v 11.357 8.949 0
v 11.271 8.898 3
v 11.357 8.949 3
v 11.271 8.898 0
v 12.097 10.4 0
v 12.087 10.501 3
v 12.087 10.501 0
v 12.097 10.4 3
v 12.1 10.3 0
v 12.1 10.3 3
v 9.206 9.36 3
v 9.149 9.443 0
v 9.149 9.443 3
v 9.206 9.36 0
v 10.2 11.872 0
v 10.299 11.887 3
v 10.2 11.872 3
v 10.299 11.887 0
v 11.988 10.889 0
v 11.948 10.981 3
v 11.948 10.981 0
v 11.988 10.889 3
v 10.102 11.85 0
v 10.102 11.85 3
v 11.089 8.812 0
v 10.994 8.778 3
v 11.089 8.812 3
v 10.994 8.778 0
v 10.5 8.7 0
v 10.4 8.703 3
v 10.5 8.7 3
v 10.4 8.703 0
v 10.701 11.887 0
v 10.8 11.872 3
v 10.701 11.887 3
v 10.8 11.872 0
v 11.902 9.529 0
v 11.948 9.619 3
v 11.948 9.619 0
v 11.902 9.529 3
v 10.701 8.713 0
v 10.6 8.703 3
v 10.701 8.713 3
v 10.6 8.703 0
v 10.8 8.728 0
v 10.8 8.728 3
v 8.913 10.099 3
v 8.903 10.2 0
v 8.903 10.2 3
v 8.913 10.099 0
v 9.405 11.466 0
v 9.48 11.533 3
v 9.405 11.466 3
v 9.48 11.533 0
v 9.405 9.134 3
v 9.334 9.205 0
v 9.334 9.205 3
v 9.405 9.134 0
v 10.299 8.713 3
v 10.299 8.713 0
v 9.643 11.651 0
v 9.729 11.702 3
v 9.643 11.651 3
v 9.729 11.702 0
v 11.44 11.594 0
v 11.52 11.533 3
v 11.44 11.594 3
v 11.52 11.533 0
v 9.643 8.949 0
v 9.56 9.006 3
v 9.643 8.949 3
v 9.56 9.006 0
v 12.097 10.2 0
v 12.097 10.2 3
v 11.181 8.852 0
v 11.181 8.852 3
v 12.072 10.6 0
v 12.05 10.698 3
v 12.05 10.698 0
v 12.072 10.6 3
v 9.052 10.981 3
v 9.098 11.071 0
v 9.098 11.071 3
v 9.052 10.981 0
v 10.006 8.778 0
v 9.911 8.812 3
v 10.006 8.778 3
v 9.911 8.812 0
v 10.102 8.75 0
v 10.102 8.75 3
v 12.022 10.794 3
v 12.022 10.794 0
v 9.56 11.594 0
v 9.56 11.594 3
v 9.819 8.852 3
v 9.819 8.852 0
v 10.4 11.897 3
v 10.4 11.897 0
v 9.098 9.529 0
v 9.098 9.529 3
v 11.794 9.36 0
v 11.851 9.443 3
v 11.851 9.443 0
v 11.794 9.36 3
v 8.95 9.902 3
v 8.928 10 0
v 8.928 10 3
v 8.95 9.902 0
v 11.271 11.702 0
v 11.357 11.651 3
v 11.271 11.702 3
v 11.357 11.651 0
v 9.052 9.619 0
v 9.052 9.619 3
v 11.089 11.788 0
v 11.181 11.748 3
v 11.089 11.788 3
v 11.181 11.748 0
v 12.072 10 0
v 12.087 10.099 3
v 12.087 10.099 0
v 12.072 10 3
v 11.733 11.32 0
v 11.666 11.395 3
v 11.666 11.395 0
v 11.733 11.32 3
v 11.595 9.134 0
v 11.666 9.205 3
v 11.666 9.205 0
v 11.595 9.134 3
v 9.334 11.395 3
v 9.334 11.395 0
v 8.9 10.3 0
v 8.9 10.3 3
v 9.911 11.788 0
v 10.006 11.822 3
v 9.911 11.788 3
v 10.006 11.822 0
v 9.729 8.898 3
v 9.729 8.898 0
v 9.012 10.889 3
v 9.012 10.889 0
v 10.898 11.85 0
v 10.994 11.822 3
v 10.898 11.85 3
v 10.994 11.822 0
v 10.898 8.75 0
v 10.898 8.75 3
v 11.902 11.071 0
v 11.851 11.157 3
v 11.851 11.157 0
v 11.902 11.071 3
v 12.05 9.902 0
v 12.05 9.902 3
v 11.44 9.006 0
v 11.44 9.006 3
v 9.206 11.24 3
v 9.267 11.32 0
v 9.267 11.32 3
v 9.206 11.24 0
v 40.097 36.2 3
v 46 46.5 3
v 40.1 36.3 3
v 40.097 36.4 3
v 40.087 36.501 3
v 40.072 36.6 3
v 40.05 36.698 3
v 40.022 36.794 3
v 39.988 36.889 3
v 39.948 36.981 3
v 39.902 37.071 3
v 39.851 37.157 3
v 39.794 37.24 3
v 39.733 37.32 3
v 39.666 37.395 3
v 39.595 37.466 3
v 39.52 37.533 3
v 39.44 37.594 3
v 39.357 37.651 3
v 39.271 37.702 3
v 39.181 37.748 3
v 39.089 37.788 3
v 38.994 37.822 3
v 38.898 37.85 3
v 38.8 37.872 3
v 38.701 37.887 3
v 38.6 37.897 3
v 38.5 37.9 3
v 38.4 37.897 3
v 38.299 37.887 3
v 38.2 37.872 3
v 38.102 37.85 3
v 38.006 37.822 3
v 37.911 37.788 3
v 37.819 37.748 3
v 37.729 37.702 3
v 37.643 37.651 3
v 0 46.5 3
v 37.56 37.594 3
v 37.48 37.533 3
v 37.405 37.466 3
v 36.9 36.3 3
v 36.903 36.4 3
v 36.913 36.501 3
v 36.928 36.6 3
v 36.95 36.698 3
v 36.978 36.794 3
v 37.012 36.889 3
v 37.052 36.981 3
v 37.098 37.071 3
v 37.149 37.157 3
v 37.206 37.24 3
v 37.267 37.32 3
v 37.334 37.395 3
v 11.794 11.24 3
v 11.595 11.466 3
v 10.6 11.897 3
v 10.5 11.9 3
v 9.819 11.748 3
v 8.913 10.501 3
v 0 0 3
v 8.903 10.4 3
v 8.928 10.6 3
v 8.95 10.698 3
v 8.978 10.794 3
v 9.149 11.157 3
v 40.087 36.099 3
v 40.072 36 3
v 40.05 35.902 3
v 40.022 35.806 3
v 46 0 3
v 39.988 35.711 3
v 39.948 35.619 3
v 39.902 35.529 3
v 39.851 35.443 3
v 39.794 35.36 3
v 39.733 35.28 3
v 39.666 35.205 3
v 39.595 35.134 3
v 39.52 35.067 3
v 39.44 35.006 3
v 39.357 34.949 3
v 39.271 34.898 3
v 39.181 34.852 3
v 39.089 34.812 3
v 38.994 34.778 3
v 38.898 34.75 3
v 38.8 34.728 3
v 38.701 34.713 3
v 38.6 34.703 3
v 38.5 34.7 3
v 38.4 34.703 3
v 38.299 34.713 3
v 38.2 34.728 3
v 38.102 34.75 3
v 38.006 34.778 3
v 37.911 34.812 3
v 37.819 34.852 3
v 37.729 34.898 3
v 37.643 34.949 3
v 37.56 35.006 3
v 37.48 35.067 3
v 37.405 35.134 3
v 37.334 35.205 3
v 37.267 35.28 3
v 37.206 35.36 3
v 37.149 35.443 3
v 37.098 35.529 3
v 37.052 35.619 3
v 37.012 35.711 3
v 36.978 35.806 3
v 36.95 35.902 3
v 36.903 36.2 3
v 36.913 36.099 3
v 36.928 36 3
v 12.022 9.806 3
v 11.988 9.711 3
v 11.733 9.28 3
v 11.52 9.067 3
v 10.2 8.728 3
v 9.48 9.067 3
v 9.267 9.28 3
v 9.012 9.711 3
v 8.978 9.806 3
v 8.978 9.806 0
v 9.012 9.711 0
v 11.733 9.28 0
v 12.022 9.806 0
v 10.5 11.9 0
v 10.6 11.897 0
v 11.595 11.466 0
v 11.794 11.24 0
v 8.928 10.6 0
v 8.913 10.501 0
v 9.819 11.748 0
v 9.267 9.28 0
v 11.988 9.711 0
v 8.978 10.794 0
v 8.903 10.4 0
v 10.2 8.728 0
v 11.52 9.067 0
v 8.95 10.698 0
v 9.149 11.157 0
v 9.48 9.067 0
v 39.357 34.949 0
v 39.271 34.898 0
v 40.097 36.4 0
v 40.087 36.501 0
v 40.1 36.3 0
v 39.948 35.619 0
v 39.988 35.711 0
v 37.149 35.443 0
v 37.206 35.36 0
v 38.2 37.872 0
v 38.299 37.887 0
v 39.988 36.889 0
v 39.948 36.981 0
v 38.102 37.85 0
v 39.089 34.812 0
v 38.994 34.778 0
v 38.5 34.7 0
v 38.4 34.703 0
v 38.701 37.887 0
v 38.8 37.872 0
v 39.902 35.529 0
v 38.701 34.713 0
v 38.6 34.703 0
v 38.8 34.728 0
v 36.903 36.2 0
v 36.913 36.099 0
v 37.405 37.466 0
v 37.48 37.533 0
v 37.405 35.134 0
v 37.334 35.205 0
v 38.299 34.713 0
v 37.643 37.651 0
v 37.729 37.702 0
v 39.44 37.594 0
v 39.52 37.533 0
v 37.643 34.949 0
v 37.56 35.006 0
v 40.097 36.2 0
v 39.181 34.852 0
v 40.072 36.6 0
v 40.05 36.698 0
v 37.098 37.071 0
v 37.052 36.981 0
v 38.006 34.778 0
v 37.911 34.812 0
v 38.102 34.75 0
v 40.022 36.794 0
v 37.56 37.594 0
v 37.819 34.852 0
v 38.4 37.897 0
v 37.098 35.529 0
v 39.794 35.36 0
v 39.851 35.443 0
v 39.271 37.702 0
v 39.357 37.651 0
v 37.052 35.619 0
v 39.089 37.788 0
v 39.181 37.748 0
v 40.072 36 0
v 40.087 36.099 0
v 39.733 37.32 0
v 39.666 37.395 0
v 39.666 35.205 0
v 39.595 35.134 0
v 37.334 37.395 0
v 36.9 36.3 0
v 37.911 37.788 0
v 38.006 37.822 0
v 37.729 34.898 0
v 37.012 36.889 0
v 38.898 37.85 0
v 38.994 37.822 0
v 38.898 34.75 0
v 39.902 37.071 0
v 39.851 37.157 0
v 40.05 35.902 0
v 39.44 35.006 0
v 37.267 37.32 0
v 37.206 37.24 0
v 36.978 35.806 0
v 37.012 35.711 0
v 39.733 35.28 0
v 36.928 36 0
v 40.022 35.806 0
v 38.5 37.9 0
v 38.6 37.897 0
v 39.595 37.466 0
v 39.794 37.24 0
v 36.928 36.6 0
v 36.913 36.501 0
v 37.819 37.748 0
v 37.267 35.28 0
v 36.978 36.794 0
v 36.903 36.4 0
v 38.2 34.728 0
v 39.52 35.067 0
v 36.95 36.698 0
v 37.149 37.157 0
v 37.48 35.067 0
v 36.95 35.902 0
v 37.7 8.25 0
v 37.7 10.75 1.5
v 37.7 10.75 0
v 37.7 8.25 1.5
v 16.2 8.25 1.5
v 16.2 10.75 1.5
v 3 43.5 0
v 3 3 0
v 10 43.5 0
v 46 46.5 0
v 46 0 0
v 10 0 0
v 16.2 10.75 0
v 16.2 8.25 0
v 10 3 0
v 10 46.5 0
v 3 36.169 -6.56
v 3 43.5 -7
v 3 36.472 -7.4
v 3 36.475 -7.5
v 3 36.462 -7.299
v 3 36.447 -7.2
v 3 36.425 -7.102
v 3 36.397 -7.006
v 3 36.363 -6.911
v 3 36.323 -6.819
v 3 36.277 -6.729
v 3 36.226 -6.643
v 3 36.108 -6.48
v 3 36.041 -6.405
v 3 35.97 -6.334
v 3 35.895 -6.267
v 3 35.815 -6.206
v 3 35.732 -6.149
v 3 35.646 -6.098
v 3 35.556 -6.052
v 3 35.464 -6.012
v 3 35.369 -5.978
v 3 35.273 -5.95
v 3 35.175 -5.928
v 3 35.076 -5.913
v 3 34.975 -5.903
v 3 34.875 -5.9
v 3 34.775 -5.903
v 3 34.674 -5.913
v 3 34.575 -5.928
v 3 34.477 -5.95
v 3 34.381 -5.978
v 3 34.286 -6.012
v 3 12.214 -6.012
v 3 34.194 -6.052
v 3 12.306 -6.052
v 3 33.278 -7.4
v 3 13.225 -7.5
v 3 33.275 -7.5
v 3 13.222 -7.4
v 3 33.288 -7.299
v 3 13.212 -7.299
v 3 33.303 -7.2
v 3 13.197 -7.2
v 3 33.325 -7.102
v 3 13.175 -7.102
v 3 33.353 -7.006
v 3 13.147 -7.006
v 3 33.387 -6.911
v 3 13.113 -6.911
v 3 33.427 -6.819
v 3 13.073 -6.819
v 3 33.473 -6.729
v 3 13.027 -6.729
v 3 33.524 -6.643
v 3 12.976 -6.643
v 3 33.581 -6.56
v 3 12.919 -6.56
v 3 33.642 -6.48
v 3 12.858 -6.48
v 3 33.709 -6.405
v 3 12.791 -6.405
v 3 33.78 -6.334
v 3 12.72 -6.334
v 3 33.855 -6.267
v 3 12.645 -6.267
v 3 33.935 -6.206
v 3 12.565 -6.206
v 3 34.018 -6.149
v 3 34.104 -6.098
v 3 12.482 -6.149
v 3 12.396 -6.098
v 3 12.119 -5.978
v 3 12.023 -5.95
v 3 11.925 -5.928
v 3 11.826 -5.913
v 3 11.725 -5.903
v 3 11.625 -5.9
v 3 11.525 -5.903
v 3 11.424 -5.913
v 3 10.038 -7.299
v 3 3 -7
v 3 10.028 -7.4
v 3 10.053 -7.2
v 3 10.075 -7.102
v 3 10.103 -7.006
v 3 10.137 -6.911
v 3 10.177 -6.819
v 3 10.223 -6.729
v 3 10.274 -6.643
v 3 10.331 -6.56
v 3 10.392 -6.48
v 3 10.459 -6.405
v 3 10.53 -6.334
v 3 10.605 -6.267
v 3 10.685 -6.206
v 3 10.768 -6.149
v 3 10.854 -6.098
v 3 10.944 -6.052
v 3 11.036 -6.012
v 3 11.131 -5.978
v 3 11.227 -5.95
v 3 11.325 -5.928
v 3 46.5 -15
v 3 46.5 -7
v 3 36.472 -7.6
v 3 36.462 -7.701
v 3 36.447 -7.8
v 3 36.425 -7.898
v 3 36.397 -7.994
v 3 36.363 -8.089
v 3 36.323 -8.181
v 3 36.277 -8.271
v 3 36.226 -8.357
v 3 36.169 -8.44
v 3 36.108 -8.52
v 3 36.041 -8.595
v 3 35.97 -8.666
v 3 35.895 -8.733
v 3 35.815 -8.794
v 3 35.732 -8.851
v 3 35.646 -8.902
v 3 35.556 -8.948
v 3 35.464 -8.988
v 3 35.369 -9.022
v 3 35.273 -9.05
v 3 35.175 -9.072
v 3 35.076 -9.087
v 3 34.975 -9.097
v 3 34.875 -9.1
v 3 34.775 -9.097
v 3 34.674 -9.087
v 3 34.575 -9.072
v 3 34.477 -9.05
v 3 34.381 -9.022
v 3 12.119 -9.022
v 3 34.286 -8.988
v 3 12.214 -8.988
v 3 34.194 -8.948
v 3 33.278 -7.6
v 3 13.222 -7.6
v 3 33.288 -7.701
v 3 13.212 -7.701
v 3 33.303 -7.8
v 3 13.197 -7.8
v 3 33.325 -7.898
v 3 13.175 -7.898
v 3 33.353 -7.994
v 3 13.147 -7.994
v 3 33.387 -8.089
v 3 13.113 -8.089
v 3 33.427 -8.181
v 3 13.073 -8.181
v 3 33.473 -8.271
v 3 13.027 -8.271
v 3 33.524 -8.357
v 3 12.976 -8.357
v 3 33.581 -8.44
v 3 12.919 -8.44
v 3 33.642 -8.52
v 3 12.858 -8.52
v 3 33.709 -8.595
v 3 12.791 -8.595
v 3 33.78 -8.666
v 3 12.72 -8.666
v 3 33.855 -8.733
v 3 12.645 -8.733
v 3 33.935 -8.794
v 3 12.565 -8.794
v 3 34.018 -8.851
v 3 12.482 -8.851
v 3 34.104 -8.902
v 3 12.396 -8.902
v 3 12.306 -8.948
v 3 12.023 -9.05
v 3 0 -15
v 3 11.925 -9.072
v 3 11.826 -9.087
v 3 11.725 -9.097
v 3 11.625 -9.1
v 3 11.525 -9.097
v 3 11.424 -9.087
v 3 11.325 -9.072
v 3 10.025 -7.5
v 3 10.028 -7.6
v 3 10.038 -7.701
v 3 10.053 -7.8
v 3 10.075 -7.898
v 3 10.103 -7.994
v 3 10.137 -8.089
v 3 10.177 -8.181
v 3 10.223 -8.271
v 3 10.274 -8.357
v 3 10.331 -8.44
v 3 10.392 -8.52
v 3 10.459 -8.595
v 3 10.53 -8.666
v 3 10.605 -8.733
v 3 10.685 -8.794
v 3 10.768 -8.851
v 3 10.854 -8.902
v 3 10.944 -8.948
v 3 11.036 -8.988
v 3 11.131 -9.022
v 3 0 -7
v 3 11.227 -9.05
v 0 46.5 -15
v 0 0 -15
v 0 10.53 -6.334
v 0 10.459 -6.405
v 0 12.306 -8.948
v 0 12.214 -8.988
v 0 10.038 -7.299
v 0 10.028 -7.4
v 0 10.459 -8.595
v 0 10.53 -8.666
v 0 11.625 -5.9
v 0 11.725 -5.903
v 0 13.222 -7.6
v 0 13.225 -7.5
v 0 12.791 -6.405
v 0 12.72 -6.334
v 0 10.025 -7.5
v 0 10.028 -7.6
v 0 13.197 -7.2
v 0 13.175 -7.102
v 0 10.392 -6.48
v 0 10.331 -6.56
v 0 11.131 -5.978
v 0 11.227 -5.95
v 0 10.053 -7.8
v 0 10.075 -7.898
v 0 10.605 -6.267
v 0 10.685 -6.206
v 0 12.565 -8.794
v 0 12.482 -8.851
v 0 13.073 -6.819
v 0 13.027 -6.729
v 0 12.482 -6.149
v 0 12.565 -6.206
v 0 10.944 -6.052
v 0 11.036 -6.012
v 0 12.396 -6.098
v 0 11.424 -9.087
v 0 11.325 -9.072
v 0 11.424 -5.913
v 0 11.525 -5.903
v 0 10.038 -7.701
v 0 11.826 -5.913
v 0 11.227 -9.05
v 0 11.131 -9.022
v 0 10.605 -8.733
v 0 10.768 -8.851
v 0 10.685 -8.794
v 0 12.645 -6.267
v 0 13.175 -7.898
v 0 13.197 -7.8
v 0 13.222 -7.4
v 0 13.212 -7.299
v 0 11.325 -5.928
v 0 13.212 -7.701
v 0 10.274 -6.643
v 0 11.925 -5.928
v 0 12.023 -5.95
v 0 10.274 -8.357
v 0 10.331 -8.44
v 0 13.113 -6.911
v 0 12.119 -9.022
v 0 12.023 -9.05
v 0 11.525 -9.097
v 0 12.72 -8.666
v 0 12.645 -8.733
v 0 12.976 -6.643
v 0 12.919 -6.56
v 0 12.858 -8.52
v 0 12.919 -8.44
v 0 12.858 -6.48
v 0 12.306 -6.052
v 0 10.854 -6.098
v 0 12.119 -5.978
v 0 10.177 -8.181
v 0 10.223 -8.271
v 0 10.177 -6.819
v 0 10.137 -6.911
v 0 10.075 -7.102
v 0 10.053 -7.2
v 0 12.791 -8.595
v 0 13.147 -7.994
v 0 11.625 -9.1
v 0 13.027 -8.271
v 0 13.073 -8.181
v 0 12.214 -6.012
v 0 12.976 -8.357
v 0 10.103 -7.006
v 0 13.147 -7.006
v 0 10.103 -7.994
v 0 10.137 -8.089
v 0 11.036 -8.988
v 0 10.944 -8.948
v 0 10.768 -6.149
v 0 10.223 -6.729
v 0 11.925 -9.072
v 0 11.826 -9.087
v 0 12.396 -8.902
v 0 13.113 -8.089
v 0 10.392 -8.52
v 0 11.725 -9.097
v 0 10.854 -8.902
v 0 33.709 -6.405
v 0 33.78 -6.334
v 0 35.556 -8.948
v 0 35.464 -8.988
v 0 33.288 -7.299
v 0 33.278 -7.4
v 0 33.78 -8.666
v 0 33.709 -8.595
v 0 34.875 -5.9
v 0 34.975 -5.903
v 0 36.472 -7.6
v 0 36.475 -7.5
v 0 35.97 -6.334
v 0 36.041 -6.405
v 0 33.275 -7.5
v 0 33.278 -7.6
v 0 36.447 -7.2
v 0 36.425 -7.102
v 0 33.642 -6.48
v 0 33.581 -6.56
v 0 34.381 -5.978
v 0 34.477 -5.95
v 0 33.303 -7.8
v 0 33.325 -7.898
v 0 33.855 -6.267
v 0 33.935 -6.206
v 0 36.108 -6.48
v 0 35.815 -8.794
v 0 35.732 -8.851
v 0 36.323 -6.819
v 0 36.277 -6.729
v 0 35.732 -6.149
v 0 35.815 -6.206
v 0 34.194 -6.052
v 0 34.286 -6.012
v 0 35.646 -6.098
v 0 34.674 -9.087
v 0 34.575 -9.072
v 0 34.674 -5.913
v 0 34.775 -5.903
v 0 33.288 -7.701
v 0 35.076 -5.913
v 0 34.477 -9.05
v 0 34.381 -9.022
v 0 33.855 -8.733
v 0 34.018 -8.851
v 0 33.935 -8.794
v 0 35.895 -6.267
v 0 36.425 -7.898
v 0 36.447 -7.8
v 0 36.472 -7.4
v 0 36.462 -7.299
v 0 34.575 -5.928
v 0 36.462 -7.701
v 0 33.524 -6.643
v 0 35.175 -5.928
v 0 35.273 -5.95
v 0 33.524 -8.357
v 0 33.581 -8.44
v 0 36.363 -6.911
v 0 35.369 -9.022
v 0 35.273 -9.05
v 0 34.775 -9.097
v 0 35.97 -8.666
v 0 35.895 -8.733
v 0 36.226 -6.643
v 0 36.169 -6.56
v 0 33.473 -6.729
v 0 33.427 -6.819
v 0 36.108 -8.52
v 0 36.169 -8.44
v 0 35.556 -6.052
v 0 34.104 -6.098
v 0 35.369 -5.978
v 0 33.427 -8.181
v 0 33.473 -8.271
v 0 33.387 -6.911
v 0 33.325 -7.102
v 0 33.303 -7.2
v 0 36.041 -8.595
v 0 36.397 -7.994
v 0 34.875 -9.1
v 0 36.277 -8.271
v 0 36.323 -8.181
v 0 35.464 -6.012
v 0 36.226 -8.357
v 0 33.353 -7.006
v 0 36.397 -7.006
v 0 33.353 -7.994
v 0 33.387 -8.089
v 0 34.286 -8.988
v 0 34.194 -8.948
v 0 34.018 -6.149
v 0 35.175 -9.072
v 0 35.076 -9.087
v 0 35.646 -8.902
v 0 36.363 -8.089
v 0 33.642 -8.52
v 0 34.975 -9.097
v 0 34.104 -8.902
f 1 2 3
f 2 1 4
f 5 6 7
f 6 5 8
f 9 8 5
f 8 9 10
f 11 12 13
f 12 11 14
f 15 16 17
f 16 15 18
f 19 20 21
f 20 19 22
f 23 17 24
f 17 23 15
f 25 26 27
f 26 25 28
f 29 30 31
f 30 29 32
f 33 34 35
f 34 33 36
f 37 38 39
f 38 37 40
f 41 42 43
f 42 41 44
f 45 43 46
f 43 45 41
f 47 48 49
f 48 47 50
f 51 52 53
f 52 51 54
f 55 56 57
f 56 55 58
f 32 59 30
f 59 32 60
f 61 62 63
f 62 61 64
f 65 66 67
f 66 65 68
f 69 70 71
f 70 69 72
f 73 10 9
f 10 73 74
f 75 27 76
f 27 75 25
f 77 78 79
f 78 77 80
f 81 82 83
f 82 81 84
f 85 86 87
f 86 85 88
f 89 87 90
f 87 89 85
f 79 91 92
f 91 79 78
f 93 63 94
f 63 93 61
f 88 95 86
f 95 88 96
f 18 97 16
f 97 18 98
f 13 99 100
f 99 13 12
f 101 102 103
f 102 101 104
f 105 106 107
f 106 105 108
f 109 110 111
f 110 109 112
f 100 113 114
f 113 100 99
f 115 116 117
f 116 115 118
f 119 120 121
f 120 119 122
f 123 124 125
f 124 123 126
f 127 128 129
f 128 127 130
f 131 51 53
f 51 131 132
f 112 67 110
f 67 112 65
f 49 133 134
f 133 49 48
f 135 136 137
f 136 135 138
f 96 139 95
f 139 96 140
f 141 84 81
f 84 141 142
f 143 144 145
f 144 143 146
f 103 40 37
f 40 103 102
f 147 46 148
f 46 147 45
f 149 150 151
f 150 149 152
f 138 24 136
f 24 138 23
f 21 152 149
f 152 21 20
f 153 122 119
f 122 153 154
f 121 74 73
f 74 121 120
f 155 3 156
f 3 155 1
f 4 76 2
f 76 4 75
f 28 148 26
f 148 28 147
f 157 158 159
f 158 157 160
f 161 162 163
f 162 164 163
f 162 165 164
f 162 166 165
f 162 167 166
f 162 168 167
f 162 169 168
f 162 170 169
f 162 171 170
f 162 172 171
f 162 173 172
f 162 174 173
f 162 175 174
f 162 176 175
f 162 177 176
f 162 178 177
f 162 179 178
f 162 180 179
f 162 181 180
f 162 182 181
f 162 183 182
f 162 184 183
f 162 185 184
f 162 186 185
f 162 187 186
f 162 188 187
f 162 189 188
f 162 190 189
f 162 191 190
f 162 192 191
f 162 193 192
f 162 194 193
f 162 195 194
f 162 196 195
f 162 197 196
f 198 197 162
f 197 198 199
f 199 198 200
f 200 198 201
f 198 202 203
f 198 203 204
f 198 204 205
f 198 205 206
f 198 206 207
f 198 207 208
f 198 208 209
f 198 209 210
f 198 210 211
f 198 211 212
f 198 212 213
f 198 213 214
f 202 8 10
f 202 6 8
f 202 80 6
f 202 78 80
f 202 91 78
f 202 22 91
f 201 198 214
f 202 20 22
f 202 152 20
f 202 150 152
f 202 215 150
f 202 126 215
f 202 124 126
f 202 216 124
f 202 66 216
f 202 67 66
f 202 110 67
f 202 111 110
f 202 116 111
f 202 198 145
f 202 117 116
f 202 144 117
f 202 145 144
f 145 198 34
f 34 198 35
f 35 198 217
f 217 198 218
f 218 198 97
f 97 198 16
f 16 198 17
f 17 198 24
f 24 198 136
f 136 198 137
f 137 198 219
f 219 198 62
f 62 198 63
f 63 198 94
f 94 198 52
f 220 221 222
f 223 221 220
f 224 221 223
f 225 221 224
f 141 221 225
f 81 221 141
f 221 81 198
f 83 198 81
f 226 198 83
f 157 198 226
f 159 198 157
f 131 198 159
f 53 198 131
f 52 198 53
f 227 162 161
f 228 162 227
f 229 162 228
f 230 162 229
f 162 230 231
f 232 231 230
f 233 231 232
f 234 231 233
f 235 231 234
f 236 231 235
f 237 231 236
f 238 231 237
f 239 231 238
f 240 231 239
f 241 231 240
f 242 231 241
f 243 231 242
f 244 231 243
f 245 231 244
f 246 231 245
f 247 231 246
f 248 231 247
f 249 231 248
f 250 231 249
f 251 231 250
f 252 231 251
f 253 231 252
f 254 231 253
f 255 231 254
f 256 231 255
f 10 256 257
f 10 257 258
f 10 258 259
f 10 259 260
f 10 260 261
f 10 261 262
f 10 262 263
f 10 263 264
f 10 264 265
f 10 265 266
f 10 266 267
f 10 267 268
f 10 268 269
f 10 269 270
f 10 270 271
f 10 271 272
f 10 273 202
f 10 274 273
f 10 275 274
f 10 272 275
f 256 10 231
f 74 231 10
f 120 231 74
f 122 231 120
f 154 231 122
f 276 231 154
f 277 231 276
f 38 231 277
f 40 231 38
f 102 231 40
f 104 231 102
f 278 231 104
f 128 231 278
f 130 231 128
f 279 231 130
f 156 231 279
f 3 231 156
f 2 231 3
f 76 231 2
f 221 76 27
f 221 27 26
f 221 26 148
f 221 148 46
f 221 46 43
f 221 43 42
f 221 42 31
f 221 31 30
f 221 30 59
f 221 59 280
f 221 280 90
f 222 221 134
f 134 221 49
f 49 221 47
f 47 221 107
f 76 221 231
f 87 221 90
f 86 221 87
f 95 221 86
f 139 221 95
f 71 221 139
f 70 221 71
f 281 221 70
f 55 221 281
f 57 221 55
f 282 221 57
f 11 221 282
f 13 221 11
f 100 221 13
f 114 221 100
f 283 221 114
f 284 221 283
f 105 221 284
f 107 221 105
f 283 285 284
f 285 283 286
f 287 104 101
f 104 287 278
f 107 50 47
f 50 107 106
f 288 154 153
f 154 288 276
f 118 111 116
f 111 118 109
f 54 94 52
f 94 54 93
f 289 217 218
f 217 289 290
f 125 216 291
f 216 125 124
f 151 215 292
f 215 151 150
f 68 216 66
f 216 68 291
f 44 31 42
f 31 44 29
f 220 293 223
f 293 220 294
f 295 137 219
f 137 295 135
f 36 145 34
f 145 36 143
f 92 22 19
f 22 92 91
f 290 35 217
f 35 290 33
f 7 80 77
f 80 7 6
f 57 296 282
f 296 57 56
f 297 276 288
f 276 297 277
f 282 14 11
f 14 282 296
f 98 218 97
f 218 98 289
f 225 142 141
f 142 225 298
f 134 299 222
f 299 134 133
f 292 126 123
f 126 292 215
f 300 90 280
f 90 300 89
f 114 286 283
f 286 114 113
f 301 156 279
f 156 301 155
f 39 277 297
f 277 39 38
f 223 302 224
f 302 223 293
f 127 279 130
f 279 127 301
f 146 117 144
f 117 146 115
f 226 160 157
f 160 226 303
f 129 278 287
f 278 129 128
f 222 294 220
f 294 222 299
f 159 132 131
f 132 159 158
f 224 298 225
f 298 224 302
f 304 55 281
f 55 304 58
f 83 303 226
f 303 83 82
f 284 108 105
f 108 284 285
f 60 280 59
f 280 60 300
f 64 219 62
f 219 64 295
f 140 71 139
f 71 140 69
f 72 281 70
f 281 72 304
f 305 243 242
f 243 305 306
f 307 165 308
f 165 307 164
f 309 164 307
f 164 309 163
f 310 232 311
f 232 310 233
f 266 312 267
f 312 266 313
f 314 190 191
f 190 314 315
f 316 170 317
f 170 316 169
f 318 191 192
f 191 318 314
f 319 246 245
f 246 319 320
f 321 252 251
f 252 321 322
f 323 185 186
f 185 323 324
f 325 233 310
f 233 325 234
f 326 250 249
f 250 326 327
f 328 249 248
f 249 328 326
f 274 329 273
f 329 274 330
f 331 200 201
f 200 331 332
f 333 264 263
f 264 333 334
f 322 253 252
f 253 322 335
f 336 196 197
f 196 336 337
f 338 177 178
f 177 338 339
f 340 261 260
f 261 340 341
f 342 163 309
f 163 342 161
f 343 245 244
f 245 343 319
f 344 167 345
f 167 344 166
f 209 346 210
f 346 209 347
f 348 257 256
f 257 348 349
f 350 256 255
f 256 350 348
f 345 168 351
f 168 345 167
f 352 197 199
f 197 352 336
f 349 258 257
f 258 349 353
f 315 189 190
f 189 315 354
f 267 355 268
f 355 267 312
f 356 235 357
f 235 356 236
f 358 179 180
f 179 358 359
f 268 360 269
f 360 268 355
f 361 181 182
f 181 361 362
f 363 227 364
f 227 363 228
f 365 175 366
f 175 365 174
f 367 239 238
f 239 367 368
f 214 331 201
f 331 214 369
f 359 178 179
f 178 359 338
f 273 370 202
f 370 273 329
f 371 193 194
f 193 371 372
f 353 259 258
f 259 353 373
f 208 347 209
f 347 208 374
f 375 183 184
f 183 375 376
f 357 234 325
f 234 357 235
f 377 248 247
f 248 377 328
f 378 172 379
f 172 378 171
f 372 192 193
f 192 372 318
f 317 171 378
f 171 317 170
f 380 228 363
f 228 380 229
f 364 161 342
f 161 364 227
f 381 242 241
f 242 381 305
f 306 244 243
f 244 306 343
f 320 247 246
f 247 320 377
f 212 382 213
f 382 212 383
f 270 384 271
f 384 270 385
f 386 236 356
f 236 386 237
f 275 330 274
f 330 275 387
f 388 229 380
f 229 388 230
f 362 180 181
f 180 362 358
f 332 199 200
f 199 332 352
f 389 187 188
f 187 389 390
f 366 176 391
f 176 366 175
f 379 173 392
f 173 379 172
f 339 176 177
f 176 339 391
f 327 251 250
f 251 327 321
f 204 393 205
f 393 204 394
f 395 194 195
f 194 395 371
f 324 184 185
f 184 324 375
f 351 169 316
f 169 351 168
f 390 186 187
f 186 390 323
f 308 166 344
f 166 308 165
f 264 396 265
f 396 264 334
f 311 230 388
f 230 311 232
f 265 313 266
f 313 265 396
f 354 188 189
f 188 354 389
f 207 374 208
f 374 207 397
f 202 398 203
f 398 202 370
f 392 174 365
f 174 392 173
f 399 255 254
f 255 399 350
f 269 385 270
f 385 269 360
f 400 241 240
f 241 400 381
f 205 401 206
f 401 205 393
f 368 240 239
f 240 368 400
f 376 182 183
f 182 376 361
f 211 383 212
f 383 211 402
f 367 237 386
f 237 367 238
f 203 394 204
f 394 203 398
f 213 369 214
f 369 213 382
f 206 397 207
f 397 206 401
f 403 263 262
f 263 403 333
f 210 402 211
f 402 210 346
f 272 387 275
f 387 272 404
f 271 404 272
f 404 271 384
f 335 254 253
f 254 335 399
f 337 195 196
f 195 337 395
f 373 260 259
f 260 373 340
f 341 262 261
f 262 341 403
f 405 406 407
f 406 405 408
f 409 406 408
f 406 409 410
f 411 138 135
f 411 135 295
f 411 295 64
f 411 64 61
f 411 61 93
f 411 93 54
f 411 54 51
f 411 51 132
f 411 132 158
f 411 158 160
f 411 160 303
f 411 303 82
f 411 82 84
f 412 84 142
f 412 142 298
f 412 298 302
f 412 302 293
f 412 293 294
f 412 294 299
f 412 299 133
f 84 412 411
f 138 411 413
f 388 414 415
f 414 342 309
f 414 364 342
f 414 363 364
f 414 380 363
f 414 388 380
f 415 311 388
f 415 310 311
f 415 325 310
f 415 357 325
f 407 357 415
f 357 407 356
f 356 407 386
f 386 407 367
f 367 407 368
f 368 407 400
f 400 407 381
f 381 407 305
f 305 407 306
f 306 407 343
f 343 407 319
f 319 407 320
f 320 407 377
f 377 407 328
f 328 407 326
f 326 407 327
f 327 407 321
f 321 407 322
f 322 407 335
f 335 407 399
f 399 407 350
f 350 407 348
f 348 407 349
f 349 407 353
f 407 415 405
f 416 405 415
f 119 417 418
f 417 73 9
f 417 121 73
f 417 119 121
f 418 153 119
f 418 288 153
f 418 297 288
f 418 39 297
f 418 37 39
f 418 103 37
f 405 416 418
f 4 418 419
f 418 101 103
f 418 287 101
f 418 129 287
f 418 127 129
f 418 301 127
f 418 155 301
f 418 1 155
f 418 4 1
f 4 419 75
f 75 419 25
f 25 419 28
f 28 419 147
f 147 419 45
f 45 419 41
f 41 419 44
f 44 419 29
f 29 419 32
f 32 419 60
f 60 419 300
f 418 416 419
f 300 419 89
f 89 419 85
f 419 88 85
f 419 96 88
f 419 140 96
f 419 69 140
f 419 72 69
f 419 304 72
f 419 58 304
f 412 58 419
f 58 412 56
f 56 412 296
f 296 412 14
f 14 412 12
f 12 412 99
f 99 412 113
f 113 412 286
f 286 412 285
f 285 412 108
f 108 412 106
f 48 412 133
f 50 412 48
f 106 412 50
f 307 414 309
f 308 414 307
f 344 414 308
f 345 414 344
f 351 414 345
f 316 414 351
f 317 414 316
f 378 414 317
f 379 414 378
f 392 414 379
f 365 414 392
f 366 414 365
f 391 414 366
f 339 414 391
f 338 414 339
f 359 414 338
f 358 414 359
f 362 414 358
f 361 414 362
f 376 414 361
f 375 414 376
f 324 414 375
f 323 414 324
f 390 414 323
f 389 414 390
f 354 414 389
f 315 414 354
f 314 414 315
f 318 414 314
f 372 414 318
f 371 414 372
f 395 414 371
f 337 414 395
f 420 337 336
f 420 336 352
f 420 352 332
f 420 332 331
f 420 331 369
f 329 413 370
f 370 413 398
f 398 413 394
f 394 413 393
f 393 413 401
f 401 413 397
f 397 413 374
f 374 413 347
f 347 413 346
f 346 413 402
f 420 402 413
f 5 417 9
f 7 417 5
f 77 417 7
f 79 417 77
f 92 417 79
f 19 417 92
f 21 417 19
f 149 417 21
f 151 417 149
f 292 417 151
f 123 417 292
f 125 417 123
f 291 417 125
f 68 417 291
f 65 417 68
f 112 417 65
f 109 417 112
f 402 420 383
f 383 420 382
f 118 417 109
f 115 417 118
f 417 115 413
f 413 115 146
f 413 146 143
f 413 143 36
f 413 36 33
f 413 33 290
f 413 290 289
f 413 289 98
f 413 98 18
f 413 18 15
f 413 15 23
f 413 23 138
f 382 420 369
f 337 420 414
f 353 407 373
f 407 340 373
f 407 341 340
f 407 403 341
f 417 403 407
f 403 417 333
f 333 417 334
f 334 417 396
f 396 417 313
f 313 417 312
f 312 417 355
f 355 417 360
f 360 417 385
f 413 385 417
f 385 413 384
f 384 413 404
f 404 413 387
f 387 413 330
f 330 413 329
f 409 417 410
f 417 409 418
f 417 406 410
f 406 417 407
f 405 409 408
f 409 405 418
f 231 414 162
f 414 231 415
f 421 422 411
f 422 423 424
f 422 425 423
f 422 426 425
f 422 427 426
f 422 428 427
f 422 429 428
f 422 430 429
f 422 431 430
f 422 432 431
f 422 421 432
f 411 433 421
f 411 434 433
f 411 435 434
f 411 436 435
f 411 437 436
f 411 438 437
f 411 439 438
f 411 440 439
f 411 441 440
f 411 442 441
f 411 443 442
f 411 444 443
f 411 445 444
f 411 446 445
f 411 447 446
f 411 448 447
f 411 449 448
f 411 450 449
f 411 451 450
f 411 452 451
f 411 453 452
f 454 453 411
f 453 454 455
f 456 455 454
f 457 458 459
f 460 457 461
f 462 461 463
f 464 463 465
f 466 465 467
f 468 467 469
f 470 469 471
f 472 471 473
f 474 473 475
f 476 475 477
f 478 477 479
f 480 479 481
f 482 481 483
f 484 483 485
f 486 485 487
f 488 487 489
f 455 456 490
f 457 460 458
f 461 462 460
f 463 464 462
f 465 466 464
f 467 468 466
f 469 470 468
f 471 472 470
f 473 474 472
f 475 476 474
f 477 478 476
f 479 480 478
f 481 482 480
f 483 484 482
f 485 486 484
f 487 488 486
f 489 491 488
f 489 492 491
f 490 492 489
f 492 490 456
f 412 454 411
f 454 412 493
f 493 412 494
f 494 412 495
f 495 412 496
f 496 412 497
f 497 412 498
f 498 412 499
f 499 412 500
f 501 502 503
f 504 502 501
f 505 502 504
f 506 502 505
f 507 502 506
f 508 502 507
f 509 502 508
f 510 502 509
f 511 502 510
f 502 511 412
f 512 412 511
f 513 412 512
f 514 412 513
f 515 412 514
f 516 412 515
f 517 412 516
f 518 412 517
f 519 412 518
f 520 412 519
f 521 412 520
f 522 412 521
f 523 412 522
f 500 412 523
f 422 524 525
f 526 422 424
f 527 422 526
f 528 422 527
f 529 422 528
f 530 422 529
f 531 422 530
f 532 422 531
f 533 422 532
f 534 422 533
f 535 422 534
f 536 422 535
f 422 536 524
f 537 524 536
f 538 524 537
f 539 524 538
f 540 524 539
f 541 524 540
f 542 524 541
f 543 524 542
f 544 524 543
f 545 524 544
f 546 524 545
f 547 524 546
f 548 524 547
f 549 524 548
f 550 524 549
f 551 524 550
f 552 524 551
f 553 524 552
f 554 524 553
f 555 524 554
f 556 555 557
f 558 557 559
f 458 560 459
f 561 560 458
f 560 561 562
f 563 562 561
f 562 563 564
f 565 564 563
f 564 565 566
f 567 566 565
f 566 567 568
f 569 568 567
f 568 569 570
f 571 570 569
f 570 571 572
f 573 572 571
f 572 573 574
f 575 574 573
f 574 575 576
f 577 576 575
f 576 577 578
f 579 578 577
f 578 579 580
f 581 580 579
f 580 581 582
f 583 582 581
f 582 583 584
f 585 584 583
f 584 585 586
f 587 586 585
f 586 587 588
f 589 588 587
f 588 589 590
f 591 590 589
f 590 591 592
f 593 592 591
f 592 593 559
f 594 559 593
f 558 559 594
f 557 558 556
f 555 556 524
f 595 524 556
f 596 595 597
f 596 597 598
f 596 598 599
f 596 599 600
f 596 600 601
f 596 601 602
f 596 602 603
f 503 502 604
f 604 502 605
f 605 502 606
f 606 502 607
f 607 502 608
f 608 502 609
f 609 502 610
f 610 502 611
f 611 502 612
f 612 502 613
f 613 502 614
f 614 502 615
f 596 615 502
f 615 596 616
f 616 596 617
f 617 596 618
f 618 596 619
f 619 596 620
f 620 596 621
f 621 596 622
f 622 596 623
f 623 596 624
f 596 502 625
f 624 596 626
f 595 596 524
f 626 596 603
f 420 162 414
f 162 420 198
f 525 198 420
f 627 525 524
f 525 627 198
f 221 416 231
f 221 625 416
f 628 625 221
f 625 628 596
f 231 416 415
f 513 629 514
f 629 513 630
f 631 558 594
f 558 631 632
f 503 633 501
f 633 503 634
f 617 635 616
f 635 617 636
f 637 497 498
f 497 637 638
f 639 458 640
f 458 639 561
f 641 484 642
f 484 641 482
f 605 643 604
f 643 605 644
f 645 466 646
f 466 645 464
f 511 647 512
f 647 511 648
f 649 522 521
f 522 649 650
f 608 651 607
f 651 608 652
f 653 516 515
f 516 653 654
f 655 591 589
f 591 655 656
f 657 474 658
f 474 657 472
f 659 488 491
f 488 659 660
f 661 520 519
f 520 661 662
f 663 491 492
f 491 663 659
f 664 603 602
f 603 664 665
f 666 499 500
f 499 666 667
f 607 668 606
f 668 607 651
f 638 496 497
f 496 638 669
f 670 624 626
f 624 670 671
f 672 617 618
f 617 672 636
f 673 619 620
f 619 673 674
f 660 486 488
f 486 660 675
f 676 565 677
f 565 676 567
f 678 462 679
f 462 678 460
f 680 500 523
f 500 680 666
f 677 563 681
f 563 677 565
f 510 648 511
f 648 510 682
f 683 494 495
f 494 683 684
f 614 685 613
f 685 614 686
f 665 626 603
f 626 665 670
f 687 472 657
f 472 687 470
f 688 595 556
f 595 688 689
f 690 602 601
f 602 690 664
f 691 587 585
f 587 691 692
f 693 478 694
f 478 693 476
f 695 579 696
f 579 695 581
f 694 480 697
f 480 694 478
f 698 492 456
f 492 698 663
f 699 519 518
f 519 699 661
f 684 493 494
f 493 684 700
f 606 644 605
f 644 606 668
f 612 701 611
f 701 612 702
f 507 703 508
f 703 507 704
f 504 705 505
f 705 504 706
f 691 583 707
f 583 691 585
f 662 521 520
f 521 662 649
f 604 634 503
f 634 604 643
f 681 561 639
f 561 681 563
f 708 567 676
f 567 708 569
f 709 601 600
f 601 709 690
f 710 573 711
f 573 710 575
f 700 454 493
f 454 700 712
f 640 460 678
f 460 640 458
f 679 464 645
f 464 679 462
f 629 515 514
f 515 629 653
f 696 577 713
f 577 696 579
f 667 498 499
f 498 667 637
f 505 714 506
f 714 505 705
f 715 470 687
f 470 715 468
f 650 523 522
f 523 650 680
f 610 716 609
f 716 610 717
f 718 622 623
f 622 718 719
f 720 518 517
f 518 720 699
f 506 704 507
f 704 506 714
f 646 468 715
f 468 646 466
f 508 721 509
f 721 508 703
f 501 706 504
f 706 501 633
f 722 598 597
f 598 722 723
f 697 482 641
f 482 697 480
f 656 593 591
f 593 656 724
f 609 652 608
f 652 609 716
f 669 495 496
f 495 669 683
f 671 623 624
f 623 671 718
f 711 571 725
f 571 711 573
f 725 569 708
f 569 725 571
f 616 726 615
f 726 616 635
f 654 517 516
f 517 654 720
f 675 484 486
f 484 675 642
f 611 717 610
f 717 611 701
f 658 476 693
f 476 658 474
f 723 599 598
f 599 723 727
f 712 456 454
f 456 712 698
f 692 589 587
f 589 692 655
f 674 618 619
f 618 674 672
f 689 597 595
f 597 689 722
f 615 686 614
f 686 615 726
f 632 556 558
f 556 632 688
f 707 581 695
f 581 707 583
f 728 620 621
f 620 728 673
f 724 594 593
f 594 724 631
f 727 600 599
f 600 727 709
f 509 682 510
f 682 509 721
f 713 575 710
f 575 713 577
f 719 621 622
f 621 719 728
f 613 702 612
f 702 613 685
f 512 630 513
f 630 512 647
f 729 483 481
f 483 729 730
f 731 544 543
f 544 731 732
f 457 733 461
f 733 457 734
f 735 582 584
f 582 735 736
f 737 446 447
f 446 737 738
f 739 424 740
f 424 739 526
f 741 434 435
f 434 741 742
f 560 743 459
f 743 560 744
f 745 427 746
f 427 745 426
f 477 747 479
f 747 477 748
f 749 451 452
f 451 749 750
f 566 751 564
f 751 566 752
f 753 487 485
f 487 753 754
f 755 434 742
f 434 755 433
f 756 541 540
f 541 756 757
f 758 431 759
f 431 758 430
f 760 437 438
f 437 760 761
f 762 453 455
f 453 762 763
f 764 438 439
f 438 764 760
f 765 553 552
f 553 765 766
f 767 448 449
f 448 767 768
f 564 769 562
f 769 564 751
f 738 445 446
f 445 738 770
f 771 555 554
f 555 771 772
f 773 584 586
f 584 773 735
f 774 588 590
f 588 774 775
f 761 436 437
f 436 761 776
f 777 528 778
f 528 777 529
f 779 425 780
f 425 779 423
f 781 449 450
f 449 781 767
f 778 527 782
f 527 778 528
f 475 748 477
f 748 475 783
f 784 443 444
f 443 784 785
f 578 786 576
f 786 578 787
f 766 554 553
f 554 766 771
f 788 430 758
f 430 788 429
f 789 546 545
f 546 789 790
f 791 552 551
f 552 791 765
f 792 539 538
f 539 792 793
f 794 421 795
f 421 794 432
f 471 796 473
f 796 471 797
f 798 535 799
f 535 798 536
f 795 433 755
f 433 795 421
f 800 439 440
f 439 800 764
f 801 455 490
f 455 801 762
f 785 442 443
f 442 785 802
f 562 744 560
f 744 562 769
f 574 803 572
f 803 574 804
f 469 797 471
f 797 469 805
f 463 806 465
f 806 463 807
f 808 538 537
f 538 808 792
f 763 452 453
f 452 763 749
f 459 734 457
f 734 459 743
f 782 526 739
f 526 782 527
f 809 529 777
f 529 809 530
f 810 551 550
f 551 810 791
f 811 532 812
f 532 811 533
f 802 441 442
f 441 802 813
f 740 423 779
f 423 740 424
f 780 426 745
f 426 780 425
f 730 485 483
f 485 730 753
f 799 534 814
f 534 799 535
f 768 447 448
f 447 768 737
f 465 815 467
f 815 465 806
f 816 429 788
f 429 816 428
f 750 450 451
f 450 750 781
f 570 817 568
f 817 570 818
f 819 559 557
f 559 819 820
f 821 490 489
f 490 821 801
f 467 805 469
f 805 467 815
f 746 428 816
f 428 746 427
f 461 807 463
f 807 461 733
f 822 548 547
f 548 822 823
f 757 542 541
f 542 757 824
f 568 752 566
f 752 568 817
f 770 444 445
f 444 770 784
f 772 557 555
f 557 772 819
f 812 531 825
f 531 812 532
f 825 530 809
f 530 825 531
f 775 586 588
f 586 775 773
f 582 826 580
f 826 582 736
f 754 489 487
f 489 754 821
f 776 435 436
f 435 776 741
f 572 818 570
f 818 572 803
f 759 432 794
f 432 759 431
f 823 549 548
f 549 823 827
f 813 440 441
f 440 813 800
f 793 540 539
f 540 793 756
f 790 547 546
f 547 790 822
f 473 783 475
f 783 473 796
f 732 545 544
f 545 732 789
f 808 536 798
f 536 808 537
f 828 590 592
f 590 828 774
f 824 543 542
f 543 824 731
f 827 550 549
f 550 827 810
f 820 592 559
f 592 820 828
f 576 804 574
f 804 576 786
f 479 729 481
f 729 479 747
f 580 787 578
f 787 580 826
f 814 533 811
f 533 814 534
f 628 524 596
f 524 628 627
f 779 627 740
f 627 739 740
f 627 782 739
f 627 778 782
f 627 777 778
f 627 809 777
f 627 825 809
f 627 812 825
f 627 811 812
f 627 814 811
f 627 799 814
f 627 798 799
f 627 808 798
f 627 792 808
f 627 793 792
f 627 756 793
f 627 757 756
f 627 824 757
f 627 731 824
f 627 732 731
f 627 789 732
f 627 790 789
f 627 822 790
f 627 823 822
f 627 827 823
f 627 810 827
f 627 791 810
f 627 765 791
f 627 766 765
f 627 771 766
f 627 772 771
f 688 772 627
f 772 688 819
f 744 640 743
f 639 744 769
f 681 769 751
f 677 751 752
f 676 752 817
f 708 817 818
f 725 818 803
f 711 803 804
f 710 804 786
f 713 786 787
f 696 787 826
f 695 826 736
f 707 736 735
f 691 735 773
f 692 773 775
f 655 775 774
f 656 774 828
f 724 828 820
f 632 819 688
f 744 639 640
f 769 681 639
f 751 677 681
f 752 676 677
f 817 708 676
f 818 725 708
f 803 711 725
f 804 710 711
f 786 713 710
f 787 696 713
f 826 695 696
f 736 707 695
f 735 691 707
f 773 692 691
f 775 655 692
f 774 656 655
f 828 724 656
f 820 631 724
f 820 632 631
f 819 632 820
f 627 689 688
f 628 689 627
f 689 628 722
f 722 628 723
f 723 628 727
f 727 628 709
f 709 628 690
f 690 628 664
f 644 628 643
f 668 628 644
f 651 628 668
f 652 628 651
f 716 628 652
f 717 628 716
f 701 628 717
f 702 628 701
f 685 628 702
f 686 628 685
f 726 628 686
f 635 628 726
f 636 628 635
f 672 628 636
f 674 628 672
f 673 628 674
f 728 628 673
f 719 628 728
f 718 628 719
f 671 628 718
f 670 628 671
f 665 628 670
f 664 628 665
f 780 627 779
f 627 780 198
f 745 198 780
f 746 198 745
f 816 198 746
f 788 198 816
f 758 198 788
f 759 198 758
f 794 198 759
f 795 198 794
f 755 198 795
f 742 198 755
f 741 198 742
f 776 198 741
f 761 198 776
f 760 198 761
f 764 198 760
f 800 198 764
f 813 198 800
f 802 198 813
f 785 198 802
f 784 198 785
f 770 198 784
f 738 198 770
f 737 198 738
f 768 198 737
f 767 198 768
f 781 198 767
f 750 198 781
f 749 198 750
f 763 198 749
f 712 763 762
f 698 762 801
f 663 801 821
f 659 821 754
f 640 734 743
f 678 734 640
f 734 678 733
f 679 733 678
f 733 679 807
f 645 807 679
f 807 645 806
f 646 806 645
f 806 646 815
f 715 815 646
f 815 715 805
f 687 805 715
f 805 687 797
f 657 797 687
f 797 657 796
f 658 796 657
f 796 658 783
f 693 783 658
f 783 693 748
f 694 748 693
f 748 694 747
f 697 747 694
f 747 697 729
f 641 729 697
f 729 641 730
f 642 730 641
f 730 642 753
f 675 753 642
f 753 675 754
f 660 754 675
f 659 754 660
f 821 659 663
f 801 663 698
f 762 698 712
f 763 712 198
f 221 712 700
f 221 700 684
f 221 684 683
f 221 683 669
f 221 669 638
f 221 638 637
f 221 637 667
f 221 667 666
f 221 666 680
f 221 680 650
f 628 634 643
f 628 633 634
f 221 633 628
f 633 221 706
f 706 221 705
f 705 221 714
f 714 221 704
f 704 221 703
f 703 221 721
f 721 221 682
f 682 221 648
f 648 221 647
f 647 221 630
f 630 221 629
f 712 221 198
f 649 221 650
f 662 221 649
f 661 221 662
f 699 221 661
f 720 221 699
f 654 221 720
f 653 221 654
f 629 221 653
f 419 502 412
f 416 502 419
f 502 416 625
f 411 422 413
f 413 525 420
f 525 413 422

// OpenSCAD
$fn = 100;

pn532_w = 43;
pn532_h = 40.5;

pn532_screws_w = 28;
pn532_screws_h = 26;
pn532_screws_offs_x = 7.5;
pn532_screws_offs_y = 7.3;

pn532_pins_offs_x = 13.2;
pn532_pins_offs_y = 5.25;
pn532_pins_w = 21.5;
pn532_pins_h = 2.5;
pn532_pins_t = 1.5;

panel_t = 3;
side_panel_h = 15;
stiffener = 7;
thread_indent_t = 3.2;

// top panel
translate(v = [panel_t, 0, 0]) 
difference() {
    cube(size = [pn532_w, pn532_h + (2 * panel_t), panel_t]);

    translate(v = [0, panel_t, 0]) { 
        // pin cavity
        translate(v = [pn532_pins_offs_x, pn532_pins_offs_y, 0]) 
            cube(size = [pn532_pins_w, pn532_pins_h, pn532_pins_t]);

        // thread indents
        for(i = [0, 1])
        translate(v = [pn532_screws_offs_x + (i * pn532_screws_w), pn532_screws_offs_y + (i * pn532_screws_h), 0])
            cylinder(h = panel_t * 2, r = thread_indent_t / 2, center=true);
    }
}

// side panel
side_panel_w = pn532_h + (2 * panel_t);
translate(v = [0, 0, -side_panel_h])
difference() {
    cube(size = [panel_t, side_panel_w, side_panel_h + panel_t]);

    // thread indents
    for(i = [side_panel_w / 4, side_panel_w * 3 / 4])
    translate(v = [0, i, side_panel_h / 2]) 
    rotate(a = [0, -90, 0])
        cylinder(h = panel_t * 2, r = thread_indent_t / 2, center=true);
}

// stiffeners
for(y = [0, pn532_h + panel_t])
translate(v = [panel_t, y, 0])
rotate(a = [-90, 0, 0]) 
linear_extrude(height = panel_t)
    polygon(points=[[0, 0], [stiffener, 0], [0, stiffener]]);
